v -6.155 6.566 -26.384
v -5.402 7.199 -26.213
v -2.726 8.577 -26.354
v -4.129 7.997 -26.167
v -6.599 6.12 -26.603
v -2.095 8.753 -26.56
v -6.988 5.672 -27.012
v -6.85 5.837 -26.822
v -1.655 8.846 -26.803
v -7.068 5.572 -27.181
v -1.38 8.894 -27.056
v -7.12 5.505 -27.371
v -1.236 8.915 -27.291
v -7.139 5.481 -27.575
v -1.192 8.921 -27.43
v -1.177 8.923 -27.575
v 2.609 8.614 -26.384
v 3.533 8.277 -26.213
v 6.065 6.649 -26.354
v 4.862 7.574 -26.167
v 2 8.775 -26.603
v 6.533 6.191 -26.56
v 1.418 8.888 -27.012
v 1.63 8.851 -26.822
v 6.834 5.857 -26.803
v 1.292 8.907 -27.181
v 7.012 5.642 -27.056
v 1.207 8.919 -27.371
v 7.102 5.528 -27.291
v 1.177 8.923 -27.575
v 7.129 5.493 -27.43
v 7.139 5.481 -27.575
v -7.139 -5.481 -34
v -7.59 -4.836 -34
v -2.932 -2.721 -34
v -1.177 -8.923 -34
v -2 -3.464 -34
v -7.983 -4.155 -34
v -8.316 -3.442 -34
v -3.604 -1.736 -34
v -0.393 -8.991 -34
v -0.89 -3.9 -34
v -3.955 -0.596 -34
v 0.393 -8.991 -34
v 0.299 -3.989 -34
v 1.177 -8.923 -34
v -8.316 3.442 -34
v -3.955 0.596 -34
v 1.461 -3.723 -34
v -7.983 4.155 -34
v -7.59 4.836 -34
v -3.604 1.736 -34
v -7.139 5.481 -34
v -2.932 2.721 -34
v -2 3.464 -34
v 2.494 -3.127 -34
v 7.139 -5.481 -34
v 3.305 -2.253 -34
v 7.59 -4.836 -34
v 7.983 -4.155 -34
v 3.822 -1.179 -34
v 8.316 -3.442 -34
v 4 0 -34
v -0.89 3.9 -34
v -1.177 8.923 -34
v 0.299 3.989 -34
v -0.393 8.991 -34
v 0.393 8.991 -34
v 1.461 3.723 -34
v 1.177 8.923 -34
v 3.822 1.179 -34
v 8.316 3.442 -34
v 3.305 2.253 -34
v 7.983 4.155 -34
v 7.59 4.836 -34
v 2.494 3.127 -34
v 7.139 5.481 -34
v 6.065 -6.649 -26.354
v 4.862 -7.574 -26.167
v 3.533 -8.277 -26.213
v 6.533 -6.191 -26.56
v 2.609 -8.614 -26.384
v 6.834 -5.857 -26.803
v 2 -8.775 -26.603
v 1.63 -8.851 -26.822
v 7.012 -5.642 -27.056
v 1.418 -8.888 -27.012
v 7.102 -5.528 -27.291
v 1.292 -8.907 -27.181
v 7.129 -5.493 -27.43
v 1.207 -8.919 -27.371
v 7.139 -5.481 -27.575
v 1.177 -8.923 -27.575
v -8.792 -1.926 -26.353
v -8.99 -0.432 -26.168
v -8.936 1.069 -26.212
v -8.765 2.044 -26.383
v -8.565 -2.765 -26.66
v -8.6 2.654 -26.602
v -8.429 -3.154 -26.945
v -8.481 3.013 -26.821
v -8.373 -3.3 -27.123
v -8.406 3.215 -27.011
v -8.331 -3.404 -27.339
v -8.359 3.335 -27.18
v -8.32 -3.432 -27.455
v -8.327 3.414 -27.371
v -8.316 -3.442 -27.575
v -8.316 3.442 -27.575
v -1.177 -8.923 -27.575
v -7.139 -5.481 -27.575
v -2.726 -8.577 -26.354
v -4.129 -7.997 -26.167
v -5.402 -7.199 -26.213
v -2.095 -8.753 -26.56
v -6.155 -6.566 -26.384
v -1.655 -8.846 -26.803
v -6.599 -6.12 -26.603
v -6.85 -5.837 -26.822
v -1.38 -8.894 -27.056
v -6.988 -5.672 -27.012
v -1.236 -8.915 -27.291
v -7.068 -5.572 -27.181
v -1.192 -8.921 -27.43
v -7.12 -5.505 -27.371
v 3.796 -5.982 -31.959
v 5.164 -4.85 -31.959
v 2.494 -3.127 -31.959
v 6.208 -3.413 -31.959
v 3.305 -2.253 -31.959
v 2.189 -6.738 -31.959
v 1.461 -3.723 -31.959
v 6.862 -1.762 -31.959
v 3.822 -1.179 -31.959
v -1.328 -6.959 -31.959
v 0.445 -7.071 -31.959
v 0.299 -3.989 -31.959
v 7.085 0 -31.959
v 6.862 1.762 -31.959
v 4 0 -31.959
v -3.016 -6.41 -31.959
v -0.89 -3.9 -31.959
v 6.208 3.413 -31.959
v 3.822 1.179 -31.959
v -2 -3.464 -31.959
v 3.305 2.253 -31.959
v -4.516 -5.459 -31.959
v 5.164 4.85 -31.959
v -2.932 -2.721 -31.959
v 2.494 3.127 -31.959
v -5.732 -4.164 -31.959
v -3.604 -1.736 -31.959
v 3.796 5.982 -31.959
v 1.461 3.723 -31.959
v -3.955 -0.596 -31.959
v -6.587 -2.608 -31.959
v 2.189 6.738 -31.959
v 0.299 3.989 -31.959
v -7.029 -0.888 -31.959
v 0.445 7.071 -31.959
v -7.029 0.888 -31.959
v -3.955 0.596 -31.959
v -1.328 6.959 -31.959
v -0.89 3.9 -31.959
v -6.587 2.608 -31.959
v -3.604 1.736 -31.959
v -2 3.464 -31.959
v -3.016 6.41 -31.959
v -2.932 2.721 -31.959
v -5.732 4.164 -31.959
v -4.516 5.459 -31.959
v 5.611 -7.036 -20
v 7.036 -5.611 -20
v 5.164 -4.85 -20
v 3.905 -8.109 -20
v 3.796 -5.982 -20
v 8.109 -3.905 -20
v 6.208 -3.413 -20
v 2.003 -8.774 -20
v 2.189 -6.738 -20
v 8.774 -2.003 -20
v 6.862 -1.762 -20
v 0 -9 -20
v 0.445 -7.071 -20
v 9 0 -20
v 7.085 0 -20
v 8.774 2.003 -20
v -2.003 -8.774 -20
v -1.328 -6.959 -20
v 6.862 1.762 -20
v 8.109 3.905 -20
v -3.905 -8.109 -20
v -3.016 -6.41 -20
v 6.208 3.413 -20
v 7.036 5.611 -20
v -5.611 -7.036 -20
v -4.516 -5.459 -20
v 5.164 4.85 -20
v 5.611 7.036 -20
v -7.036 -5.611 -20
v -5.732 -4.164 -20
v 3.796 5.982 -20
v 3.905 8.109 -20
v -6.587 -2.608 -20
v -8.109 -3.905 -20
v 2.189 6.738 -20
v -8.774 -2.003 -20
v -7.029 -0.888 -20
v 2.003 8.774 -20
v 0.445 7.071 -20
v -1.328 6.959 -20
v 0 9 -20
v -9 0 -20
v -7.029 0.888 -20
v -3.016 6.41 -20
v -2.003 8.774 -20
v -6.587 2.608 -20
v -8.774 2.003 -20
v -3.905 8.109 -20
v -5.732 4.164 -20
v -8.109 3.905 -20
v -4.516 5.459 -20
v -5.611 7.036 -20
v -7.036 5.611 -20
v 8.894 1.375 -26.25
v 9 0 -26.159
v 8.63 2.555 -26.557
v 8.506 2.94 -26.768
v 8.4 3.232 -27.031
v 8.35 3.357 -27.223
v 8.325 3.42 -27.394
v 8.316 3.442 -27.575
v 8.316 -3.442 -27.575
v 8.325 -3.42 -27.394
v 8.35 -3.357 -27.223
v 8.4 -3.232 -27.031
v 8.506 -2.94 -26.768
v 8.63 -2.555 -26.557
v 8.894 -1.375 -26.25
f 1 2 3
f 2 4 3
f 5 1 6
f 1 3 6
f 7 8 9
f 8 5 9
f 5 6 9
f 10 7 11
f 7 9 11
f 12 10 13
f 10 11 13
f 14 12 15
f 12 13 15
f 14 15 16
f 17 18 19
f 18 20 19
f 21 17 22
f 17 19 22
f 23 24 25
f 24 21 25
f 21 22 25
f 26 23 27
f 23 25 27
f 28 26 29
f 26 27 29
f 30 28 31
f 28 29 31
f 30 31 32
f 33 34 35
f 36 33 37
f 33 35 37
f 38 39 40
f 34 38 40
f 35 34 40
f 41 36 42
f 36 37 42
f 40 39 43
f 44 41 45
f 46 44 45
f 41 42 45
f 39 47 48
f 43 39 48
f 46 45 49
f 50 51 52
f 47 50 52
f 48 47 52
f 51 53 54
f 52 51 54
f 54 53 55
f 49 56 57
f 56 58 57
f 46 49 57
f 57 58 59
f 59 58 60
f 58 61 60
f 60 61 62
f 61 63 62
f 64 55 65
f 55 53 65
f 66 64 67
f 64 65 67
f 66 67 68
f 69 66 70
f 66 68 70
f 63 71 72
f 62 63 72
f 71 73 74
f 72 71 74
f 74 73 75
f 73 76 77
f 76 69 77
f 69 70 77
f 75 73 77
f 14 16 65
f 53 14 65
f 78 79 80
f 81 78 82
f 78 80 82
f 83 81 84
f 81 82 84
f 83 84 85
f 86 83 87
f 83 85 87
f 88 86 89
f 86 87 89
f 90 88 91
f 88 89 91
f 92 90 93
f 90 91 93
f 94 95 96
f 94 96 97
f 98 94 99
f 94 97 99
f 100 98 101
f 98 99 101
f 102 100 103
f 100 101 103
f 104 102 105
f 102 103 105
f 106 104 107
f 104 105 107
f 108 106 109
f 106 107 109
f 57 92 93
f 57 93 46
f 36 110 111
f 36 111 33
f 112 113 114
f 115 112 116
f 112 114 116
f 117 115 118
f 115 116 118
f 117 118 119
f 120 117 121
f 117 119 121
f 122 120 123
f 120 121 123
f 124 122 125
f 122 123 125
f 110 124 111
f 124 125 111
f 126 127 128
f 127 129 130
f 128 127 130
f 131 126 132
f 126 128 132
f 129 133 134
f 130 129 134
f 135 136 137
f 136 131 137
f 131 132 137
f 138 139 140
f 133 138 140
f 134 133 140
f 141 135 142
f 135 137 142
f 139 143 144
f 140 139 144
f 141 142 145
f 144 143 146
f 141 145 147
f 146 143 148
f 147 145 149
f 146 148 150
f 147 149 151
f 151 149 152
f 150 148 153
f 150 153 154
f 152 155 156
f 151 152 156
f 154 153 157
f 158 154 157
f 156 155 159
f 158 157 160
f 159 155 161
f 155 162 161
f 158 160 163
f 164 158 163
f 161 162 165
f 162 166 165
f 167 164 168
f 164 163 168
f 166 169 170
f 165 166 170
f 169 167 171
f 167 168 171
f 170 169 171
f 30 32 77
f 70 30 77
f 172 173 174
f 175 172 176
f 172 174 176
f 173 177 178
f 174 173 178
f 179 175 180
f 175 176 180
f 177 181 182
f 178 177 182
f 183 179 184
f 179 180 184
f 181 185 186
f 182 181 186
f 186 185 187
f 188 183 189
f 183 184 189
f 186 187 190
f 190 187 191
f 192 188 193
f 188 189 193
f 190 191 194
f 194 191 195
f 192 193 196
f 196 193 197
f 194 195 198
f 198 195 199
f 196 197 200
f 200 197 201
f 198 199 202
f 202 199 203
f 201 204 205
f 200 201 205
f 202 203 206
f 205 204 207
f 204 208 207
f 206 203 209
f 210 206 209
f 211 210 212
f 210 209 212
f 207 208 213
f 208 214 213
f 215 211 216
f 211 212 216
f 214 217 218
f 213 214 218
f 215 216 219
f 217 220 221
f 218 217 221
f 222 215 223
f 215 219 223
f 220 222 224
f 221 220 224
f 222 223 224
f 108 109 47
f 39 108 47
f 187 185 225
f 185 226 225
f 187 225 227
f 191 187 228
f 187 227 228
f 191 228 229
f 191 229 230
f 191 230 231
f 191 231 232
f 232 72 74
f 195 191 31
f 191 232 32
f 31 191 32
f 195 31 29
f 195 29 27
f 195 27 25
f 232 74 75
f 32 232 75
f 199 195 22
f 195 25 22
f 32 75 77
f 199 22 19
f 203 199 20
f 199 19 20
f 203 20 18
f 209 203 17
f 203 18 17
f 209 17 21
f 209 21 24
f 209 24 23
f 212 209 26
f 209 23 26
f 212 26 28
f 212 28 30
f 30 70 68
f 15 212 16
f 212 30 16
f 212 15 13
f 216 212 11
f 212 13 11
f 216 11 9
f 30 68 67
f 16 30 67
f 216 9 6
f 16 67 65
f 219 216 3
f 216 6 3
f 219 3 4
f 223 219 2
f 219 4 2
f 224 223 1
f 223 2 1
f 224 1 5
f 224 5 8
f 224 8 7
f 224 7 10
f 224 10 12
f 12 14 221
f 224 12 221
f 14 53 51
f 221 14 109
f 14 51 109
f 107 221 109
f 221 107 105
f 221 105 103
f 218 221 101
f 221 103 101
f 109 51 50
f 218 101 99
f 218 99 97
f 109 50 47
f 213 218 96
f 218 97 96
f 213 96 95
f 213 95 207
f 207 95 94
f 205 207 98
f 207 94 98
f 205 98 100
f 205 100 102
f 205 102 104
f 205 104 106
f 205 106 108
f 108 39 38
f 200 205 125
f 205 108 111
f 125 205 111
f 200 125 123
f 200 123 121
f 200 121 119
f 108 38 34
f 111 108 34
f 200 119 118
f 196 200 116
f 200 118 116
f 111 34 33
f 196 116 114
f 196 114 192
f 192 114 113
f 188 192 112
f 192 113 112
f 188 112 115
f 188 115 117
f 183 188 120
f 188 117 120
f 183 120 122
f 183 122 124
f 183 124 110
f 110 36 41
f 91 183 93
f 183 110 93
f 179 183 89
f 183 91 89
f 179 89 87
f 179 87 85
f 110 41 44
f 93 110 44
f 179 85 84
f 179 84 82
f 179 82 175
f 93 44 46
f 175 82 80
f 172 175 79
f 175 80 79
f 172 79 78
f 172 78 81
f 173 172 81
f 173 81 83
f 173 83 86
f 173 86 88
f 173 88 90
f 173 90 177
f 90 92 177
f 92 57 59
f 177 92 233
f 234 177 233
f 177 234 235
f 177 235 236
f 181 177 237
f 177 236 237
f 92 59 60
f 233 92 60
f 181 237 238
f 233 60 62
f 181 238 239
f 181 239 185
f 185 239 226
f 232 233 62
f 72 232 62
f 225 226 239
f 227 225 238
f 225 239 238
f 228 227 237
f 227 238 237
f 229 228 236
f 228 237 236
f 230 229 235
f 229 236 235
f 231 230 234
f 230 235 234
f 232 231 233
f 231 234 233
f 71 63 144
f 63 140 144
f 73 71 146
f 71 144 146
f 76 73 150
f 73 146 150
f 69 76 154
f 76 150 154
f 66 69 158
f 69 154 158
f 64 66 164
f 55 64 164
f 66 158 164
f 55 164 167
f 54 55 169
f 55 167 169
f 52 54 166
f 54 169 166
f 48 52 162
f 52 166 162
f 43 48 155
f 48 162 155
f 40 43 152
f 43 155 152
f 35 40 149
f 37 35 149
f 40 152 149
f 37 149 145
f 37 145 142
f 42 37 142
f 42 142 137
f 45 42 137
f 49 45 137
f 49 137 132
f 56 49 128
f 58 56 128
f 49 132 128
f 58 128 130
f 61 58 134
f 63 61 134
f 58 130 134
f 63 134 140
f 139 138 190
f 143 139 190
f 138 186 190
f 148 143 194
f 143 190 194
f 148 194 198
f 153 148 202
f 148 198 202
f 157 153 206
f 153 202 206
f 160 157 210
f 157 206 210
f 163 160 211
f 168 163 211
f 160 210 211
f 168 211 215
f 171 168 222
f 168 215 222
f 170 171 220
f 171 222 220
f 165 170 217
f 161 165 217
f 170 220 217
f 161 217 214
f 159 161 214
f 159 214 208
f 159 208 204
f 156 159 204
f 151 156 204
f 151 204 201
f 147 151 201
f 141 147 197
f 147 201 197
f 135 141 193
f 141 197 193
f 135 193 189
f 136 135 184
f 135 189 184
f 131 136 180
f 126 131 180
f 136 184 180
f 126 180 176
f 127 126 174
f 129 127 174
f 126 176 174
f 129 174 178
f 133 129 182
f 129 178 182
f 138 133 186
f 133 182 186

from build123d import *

# Parameters (mm, degrees)
POCKET003_DEPTH    = 10
POLARPATTERN_COUNT = 6


with BuildPart() as part:
    # Sketch012 → Revolution001 (revolve)
    with BuildSketch(Plane.XZ):
        Polygon((4, 0), (4, 2.040516), (7.084628, 2.040516), (7.084628, 14), (9, 14), (9, 0), align=None)
    revolve(axis=Axis((0, 0, 0), (0, 0, 1)))

    # Sketch013 → Pocket003 (cut, symmetric)
    with BuildSketch(Plane.XZ):
        with BuildLine():
            ThreePointArc((11.928039, 6.425307), (10.121972, 8.231374), (8.315905, 6.425307))
            Line((8.315905, 6.425307), (8.315905, -3.082439))
            ThreePointArc((8.315905, -3.082439), (10.121972, -4.888506), (11.928039, -3.082439))
            Line((11.928039, 6.425307), (11.928039, -3.082439))
        make_face()
    pocket003 = extrude(amount=POCKET003_DEPTH, both=True, mode=Mode.SUBTRACT)

    # PolarPattern: Pocket003 ×6 about axis
    polarpattern_axis = Axis((0, 0, 0), (0, 0, 1))
    for i in range(1, POLARPATTERN_COUNT):
        add(pocket003.rotate(polarpattern_axis, i * 360 / POLARPATTERN_COUNT), mode=Mode.SUBTRACT)


with BuildPart() as part_1:
    # Body006 placement: moved
    add(part.part.moved(Location((0, 0, -34))))


solid = part_1.part
